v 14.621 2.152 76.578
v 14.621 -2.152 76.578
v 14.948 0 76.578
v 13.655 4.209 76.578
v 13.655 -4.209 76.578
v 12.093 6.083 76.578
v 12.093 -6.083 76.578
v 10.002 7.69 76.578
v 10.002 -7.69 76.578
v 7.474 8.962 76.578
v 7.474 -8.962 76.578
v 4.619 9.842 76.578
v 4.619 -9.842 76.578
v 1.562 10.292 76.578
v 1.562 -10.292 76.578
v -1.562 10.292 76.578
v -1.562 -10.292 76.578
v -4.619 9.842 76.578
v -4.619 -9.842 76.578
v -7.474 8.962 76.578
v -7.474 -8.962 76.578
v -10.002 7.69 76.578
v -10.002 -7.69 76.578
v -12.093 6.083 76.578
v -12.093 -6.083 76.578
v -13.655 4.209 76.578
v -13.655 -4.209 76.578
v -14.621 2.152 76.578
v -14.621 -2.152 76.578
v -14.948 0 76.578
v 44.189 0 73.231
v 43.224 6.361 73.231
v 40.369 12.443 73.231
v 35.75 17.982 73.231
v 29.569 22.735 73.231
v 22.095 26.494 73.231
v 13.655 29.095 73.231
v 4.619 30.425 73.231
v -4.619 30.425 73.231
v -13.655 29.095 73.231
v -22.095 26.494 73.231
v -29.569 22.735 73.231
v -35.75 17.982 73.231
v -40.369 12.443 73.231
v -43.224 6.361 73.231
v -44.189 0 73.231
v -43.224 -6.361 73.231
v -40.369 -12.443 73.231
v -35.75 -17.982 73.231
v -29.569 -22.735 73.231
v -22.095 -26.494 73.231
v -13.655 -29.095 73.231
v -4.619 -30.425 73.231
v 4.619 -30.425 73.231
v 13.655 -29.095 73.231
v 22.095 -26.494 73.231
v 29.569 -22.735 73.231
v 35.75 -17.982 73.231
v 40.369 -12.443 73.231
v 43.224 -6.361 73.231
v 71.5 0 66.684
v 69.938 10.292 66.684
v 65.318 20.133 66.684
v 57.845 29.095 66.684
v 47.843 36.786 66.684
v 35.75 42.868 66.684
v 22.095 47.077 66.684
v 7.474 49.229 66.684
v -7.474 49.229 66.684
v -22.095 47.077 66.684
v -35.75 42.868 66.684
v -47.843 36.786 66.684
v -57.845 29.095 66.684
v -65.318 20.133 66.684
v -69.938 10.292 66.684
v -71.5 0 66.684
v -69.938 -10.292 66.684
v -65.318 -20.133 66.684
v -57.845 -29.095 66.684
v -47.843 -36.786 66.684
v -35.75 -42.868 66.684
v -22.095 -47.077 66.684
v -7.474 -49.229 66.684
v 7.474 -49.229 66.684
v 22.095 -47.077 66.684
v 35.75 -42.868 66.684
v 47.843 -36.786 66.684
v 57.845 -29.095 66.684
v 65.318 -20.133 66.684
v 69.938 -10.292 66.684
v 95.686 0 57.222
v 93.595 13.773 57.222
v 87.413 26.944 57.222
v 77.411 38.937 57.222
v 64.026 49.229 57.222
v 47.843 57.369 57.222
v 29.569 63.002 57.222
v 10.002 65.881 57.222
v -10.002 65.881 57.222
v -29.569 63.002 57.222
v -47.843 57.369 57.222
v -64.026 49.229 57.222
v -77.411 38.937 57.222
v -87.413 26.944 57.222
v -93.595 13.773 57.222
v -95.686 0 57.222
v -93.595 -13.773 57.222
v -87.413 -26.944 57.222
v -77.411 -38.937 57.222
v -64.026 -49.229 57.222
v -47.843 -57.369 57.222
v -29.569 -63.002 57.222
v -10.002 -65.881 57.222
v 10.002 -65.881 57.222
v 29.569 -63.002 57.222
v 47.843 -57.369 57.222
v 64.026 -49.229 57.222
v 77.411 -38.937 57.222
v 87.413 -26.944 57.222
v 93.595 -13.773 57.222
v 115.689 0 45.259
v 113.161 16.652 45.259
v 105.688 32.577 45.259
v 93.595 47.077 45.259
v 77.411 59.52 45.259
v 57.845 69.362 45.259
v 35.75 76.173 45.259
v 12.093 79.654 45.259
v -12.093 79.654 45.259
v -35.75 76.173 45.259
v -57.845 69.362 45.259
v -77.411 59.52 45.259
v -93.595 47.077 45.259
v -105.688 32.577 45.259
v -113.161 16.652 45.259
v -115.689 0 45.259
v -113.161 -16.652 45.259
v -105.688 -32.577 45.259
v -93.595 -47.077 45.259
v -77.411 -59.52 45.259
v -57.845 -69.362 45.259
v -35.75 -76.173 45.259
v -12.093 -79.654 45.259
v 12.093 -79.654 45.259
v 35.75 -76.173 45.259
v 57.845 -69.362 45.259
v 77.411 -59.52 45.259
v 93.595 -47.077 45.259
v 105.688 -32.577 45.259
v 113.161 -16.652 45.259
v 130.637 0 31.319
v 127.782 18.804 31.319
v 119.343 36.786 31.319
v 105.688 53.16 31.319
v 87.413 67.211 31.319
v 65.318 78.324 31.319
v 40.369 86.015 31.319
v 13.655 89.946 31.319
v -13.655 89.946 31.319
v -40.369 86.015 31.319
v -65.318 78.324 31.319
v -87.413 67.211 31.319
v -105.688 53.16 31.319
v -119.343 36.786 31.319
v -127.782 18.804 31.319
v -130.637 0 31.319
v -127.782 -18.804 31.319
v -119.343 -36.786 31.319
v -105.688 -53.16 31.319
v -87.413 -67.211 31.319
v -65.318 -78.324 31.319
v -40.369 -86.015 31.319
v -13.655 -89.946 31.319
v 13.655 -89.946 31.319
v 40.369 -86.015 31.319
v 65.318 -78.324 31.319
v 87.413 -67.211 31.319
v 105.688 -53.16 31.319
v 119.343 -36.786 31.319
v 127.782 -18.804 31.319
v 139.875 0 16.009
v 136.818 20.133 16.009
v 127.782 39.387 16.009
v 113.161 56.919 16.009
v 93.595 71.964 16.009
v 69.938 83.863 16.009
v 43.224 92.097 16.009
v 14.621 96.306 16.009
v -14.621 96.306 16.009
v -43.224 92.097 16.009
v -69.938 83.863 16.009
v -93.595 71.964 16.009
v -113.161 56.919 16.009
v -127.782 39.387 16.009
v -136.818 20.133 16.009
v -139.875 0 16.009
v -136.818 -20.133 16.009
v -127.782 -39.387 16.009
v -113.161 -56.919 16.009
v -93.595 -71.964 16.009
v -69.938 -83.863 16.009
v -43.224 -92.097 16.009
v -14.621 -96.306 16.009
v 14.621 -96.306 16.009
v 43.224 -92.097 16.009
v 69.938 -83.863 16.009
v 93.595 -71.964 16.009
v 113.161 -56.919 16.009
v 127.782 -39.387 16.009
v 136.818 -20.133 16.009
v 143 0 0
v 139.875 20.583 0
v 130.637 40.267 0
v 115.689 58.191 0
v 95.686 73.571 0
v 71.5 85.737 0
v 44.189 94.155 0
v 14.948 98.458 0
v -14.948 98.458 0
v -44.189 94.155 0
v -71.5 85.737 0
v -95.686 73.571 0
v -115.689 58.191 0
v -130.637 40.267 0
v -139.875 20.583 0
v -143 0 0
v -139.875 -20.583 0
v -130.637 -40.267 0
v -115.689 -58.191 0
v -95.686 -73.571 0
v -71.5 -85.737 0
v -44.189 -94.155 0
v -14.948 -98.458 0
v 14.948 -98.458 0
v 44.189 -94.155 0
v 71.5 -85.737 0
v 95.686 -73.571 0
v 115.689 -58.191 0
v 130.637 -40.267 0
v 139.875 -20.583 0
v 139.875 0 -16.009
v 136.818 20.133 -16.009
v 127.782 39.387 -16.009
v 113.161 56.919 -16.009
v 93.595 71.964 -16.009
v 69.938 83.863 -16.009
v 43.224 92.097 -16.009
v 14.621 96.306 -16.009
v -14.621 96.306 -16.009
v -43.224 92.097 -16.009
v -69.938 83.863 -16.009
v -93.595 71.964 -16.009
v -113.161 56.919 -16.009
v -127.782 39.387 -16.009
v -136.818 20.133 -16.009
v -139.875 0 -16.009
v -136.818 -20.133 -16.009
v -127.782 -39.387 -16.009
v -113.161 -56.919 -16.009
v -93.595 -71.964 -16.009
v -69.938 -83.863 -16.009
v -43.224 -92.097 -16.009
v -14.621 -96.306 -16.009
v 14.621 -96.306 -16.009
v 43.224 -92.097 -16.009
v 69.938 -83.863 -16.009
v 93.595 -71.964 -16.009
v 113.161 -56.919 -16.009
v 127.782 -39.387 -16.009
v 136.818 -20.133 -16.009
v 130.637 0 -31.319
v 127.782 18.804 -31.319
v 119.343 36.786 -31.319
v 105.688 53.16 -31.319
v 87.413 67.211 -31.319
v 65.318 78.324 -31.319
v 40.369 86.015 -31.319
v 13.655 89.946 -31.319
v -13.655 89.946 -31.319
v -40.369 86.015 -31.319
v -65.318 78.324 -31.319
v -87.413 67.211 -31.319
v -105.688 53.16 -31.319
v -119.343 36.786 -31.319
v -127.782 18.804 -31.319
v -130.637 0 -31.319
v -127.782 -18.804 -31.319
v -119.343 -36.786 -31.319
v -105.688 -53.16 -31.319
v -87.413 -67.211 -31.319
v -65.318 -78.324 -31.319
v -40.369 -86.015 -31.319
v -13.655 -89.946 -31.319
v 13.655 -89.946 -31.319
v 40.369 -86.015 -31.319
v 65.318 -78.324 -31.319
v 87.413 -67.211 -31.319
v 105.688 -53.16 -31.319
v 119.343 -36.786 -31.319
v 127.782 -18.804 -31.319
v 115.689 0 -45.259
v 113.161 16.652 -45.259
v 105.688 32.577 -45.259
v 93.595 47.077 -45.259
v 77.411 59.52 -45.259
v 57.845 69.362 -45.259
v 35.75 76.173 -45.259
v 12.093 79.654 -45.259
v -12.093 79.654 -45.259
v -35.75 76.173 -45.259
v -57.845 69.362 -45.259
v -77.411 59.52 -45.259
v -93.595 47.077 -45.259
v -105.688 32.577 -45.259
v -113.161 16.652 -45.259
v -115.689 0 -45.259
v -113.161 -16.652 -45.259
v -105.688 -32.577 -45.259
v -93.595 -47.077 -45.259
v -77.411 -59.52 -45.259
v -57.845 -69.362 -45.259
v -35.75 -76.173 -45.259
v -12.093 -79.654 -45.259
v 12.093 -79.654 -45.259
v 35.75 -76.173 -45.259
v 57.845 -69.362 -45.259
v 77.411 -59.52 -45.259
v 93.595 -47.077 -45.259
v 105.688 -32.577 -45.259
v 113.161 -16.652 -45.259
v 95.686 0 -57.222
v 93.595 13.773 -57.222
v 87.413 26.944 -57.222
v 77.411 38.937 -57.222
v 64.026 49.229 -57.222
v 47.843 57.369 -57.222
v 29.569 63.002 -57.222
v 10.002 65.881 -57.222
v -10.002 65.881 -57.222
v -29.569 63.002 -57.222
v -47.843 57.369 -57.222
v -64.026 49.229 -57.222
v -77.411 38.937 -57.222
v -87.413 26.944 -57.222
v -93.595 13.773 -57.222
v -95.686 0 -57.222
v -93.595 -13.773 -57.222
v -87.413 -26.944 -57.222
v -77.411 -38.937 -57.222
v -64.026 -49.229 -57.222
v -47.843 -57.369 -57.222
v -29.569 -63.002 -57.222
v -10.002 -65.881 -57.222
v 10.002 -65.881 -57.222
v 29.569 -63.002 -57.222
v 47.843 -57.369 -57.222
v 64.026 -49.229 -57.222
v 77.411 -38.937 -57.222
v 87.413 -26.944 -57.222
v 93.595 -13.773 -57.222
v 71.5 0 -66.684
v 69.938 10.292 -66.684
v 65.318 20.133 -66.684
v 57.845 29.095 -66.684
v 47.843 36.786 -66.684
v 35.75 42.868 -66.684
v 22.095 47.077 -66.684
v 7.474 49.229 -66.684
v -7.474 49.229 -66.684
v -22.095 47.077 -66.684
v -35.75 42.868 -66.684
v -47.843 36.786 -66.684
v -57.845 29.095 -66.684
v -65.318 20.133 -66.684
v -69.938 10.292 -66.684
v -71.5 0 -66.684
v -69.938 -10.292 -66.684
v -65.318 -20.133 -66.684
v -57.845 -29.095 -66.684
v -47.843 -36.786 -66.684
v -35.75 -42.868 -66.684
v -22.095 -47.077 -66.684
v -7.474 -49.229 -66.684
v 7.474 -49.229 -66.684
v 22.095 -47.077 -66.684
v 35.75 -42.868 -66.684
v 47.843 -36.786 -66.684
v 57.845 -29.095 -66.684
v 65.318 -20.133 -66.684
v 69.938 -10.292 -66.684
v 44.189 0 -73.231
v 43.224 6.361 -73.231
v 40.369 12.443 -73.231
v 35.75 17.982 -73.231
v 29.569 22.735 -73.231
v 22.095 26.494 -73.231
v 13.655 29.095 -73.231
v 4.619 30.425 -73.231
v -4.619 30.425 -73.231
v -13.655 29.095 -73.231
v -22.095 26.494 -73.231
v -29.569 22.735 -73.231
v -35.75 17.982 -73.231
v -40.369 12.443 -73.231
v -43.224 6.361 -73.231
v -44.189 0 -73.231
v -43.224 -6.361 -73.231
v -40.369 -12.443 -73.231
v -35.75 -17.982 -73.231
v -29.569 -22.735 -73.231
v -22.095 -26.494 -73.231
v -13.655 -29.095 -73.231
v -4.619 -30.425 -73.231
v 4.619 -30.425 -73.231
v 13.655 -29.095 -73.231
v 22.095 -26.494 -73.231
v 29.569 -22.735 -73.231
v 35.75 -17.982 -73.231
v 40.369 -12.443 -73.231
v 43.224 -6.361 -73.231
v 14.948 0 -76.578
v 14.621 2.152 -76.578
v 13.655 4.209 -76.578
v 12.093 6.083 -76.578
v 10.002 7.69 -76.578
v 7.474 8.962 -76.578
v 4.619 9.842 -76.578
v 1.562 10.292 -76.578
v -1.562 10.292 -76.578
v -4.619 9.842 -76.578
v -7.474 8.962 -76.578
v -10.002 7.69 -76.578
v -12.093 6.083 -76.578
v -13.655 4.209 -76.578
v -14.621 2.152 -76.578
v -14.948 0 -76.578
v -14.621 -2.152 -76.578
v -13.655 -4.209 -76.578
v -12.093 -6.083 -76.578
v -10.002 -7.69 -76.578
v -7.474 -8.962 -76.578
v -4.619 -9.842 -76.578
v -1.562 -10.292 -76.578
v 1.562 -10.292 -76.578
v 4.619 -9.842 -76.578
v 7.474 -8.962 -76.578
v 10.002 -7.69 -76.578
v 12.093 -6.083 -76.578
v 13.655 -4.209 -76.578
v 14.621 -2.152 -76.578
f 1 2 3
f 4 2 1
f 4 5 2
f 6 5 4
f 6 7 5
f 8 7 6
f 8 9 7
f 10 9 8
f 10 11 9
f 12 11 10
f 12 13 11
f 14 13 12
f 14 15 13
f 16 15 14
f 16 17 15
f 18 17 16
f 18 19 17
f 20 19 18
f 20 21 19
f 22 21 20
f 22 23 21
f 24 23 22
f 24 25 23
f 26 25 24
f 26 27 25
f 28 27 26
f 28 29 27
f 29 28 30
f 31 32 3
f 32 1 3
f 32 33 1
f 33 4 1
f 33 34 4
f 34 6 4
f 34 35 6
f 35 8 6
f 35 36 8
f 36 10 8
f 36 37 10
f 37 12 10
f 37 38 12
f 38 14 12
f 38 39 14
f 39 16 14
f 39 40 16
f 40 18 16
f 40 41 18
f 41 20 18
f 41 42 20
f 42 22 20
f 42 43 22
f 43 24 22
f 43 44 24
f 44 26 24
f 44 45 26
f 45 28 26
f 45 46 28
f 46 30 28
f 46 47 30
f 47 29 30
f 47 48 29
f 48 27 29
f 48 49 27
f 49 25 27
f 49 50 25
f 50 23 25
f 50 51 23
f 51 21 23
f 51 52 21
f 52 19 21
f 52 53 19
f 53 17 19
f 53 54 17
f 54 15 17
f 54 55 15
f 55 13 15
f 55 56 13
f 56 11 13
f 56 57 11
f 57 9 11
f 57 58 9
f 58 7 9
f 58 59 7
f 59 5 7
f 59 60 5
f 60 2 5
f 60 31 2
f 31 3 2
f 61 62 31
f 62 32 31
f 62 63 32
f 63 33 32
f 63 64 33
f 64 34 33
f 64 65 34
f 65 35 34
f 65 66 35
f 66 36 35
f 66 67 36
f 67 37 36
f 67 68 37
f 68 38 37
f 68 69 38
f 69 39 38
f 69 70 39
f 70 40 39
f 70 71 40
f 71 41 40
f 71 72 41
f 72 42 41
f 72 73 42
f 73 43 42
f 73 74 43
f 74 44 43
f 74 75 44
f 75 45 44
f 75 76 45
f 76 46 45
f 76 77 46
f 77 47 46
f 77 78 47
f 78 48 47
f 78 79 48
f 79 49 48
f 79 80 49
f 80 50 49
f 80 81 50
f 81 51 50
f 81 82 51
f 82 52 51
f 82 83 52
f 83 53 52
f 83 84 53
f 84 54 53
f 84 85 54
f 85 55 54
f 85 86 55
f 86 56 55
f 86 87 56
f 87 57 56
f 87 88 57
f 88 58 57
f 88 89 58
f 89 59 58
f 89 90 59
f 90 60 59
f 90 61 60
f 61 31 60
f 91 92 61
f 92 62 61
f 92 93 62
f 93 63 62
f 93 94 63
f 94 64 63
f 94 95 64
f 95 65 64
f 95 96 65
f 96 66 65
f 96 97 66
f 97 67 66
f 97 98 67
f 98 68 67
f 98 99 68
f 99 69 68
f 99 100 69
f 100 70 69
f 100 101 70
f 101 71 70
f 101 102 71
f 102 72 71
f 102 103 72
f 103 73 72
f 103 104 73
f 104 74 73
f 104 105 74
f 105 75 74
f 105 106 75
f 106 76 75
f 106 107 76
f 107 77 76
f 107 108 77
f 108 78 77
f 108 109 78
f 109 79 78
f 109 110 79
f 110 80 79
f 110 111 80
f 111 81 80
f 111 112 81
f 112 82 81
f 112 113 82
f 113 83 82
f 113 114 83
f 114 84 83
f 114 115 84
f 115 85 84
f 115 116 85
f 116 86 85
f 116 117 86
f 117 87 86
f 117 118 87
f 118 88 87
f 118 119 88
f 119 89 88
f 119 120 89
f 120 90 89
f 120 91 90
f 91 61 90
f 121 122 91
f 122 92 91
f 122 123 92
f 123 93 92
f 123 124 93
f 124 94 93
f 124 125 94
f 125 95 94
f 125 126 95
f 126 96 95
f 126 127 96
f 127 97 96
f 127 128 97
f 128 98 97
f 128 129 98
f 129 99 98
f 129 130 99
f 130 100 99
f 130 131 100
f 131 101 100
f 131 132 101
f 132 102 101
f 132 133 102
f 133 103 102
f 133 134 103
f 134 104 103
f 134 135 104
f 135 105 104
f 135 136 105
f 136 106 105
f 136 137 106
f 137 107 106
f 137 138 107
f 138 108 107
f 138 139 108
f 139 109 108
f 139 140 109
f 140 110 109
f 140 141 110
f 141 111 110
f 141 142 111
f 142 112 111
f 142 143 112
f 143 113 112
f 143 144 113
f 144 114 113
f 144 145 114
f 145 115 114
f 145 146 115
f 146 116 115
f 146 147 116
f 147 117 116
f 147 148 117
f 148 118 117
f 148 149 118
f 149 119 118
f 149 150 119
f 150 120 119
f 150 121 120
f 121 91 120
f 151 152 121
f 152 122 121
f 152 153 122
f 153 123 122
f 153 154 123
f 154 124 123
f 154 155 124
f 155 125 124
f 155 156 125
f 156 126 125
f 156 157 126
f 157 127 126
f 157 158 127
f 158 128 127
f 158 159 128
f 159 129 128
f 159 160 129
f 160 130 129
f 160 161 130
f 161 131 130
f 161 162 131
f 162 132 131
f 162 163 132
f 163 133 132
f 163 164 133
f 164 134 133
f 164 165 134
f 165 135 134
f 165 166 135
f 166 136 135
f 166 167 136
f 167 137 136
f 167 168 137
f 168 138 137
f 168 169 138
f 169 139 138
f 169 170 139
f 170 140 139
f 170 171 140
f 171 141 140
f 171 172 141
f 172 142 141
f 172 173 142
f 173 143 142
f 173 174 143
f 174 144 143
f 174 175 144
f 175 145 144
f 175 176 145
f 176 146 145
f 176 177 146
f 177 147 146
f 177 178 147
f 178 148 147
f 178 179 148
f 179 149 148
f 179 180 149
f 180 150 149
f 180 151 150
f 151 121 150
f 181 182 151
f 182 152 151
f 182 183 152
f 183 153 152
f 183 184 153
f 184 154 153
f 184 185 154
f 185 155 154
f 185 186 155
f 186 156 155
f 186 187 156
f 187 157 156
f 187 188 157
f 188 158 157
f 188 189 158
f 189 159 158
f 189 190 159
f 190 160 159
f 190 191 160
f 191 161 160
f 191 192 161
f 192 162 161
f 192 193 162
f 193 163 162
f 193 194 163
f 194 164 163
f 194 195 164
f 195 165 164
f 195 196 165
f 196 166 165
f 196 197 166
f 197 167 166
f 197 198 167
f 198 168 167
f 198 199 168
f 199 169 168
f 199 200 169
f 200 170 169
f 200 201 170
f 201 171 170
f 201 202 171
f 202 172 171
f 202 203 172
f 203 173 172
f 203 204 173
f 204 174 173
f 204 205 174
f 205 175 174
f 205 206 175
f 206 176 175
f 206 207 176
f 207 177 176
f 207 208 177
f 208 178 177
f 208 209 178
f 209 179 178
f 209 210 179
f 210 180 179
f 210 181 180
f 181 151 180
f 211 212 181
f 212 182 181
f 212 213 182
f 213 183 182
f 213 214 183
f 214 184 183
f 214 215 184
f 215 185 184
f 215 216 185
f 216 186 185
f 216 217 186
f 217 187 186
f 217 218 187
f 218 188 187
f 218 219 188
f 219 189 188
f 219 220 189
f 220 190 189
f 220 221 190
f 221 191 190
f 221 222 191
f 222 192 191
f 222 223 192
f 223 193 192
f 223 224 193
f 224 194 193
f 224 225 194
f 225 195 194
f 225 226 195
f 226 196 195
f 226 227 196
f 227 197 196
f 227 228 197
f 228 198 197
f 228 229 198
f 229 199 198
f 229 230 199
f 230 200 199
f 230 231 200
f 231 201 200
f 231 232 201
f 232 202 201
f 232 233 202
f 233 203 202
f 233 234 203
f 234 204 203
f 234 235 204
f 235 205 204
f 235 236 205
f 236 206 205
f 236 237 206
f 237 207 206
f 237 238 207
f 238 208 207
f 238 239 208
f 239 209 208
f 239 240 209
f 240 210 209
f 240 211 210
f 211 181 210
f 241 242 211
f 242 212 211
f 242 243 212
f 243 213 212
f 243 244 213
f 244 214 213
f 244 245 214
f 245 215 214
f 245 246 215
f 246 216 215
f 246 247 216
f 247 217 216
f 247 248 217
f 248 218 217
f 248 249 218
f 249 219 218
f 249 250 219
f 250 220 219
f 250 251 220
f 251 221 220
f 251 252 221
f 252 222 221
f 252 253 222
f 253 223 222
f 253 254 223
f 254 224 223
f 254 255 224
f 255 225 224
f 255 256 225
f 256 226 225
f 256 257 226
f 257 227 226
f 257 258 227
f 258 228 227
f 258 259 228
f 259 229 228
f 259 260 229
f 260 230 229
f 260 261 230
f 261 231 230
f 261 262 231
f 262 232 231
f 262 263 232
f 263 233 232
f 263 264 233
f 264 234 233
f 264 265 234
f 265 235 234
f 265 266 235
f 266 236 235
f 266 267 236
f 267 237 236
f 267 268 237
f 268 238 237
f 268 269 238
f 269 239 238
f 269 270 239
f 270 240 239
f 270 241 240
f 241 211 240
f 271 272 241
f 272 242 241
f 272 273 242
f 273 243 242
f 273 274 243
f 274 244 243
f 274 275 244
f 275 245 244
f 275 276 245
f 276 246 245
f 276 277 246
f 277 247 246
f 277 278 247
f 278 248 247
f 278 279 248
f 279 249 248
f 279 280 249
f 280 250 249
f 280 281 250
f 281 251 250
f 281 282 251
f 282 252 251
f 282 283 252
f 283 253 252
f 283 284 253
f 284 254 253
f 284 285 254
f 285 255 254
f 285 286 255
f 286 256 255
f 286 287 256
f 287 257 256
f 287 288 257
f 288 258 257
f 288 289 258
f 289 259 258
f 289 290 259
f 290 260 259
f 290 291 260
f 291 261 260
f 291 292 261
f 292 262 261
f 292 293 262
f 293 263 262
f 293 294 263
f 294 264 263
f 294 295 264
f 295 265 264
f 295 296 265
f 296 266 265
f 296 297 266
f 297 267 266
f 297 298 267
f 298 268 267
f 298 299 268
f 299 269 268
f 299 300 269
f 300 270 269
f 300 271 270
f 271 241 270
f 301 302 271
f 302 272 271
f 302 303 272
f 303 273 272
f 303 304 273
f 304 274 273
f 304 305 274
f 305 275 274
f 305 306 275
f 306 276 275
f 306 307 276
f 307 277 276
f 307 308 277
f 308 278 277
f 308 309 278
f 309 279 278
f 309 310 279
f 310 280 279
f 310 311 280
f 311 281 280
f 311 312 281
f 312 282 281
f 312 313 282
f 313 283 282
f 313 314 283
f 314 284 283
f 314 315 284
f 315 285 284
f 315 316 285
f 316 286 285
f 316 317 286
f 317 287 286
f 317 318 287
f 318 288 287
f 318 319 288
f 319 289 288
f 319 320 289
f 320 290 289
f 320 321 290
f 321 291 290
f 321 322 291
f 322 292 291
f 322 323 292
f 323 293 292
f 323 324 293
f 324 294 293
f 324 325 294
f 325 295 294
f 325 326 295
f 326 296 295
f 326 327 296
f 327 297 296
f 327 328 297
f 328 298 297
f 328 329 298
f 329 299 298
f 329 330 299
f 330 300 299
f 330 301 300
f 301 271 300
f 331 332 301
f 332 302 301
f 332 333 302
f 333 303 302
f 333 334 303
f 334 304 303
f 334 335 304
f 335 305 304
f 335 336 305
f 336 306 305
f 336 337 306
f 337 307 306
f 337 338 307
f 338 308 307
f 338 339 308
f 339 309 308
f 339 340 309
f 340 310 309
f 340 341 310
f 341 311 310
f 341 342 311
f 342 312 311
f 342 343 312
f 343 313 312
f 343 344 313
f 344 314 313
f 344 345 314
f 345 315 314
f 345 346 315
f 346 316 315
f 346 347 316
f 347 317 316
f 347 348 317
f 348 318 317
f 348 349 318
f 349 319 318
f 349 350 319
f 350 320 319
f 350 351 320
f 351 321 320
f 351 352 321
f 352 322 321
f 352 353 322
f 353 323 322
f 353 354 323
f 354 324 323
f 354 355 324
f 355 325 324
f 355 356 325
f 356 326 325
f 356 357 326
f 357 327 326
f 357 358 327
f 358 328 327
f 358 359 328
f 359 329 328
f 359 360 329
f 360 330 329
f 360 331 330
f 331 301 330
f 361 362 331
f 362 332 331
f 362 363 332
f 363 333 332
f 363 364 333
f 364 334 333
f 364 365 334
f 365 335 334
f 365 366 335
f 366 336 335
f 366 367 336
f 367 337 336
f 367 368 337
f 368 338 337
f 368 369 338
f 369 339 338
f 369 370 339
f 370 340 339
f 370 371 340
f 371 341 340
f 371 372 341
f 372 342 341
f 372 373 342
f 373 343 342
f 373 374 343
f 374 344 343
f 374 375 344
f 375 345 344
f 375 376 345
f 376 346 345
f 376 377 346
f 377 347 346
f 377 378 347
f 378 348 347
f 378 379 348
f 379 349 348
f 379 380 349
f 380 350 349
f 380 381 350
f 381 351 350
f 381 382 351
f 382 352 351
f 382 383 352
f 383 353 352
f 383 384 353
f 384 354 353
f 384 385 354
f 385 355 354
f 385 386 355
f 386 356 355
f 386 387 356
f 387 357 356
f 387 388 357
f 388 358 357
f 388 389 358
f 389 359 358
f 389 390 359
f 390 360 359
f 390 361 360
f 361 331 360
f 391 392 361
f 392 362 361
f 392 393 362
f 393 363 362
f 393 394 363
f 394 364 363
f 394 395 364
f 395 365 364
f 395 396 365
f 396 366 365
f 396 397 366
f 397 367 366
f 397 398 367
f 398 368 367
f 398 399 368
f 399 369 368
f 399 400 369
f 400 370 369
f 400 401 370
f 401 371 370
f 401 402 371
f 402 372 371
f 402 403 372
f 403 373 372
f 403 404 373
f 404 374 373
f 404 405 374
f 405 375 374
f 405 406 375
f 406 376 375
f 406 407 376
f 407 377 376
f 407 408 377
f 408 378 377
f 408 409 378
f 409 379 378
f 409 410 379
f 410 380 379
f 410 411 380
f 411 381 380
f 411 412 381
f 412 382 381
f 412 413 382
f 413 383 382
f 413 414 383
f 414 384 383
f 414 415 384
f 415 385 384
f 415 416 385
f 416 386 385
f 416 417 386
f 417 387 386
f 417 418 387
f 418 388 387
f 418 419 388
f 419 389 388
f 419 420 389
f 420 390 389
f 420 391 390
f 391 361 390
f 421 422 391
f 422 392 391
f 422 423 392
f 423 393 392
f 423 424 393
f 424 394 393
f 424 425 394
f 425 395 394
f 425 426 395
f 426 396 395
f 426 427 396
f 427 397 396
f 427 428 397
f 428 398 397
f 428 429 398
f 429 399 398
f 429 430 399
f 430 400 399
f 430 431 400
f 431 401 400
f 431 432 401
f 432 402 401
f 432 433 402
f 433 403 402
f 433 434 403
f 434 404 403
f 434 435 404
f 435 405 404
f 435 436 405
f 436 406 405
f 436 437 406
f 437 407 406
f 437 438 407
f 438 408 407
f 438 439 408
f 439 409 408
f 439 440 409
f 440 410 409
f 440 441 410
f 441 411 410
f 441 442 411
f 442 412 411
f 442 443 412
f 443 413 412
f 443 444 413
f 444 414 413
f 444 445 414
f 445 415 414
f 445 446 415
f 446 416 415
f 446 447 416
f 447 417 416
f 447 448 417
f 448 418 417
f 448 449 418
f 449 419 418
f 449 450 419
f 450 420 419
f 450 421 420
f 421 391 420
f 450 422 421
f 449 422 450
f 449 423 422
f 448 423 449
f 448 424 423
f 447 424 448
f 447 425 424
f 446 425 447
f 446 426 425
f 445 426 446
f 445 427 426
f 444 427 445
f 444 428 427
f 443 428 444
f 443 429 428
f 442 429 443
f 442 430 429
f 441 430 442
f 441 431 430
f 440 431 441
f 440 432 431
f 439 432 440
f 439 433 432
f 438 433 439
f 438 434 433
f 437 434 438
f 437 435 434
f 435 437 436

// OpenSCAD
// Generated by SolidPython 1.0.1 on 2020-07-29 00:46:50


scale(v = [13, 9, 7]) {
	sphere(r = 11);
}
/***********************************************
*********      SolidPython code:      **********
************************************************
 
# import packages: SolidPython
from solid import *
from solid.utils import *
from itertools import chain, combinations, permutations


class Resize:

    def __init__(self, scad_file):
        self.scad_file = scad_file
        #self.scad_file = import_scad(scad_file)
        # cone/cylinder param:
        self.r1 = 0
        self.r2 = 0
        self.h = 0
        # rectangular prism param:
        self.w = 0
        self.l = 0
        # ellipse param:
        self.r = 0

    # import OpenScad code (file name corresponds to shape)


    # classify shape + parameters
    def assign(self, param1, param2, param3):
        if self.scad_file == 'cone.scad':
            self.r1 = param1
            self.r2 = param2
            self.h = param3
        elif self.scad_file == 'cylinder.scad':
            self.r1 = param1
            self.r2 = param2
            self.h = param3
        elif self.scad_file == 'rectangularPrism.scad':
            self.h = param1
            self.l = param2
            self.w = param3
        else:
            self.r = param1
            self.h = param2

    # resize parameters
    def iterate(self):
        x = range(3, 20, 2)
        i = 1
        if self.scad_file == 'cone.scad':
            tempList = list(permutations(x, 2))
            for temp in tempList:
                param1 = temp[0]
                param2 = temp[1]
                filepath = 'produced_scad_files/' + 'cone' + str(param1) + '_' + str(param2) + '_' + '.scad'
                scad_render_to_file(cylinder(h=param1, r1=param2, r2=0), filepath)

        elif self.scad_file == 'cylinder.scad':
            tempList = list(permutations(x, 3))
            for temp in tempList:
                param1 = temp[0]
                param2 = temp[1]
                filepath = 'produced_scad_files/' + 'cylinder' + str(param1) + '_' + str(param2) + '_' + '.scad'
                scad_render_to_file(cylinder(h=param1, r1=param2, r2=param2), filepath)

        elif self.scad_file == 'rectangularPrism.scad':
            tempList = list(permutations(x, 3))
            for temp in tempList:
                param1 = temp[0]
                param2 = temp[1]
                param3 = temp[2]
                filepath = 'produced_scad_files/' + 'rectangularPrism' + str(param1) + '_' + str(param2) + '_' + str(
                    param3) + '.scad'
                scad_render_to_file(cube(size=(param1, param2, param3)), filepath)

        elif self.scad_file == 'ellipse.scad':
            tempList = list(permutations(x, 4))
            for temp in tempList:
                param1 = temp[0]
                param2 = temp[1]
                param3 = temp[2]
                param4 = temp[3]
                filepath = 'produced_scad_files/' + 'ellipse' + str(param1) + '_' + str(param2) + '_' + str(param3) + '_' + str(param4) + '.scad'
                scad_render_to_file(scale([param1, param2, param3])(sphere(r=param4)), filepath)

    def render_to_scadfile(self):
        scad_render_to_file(scad, 'example.scad') 
 
************************************************/
